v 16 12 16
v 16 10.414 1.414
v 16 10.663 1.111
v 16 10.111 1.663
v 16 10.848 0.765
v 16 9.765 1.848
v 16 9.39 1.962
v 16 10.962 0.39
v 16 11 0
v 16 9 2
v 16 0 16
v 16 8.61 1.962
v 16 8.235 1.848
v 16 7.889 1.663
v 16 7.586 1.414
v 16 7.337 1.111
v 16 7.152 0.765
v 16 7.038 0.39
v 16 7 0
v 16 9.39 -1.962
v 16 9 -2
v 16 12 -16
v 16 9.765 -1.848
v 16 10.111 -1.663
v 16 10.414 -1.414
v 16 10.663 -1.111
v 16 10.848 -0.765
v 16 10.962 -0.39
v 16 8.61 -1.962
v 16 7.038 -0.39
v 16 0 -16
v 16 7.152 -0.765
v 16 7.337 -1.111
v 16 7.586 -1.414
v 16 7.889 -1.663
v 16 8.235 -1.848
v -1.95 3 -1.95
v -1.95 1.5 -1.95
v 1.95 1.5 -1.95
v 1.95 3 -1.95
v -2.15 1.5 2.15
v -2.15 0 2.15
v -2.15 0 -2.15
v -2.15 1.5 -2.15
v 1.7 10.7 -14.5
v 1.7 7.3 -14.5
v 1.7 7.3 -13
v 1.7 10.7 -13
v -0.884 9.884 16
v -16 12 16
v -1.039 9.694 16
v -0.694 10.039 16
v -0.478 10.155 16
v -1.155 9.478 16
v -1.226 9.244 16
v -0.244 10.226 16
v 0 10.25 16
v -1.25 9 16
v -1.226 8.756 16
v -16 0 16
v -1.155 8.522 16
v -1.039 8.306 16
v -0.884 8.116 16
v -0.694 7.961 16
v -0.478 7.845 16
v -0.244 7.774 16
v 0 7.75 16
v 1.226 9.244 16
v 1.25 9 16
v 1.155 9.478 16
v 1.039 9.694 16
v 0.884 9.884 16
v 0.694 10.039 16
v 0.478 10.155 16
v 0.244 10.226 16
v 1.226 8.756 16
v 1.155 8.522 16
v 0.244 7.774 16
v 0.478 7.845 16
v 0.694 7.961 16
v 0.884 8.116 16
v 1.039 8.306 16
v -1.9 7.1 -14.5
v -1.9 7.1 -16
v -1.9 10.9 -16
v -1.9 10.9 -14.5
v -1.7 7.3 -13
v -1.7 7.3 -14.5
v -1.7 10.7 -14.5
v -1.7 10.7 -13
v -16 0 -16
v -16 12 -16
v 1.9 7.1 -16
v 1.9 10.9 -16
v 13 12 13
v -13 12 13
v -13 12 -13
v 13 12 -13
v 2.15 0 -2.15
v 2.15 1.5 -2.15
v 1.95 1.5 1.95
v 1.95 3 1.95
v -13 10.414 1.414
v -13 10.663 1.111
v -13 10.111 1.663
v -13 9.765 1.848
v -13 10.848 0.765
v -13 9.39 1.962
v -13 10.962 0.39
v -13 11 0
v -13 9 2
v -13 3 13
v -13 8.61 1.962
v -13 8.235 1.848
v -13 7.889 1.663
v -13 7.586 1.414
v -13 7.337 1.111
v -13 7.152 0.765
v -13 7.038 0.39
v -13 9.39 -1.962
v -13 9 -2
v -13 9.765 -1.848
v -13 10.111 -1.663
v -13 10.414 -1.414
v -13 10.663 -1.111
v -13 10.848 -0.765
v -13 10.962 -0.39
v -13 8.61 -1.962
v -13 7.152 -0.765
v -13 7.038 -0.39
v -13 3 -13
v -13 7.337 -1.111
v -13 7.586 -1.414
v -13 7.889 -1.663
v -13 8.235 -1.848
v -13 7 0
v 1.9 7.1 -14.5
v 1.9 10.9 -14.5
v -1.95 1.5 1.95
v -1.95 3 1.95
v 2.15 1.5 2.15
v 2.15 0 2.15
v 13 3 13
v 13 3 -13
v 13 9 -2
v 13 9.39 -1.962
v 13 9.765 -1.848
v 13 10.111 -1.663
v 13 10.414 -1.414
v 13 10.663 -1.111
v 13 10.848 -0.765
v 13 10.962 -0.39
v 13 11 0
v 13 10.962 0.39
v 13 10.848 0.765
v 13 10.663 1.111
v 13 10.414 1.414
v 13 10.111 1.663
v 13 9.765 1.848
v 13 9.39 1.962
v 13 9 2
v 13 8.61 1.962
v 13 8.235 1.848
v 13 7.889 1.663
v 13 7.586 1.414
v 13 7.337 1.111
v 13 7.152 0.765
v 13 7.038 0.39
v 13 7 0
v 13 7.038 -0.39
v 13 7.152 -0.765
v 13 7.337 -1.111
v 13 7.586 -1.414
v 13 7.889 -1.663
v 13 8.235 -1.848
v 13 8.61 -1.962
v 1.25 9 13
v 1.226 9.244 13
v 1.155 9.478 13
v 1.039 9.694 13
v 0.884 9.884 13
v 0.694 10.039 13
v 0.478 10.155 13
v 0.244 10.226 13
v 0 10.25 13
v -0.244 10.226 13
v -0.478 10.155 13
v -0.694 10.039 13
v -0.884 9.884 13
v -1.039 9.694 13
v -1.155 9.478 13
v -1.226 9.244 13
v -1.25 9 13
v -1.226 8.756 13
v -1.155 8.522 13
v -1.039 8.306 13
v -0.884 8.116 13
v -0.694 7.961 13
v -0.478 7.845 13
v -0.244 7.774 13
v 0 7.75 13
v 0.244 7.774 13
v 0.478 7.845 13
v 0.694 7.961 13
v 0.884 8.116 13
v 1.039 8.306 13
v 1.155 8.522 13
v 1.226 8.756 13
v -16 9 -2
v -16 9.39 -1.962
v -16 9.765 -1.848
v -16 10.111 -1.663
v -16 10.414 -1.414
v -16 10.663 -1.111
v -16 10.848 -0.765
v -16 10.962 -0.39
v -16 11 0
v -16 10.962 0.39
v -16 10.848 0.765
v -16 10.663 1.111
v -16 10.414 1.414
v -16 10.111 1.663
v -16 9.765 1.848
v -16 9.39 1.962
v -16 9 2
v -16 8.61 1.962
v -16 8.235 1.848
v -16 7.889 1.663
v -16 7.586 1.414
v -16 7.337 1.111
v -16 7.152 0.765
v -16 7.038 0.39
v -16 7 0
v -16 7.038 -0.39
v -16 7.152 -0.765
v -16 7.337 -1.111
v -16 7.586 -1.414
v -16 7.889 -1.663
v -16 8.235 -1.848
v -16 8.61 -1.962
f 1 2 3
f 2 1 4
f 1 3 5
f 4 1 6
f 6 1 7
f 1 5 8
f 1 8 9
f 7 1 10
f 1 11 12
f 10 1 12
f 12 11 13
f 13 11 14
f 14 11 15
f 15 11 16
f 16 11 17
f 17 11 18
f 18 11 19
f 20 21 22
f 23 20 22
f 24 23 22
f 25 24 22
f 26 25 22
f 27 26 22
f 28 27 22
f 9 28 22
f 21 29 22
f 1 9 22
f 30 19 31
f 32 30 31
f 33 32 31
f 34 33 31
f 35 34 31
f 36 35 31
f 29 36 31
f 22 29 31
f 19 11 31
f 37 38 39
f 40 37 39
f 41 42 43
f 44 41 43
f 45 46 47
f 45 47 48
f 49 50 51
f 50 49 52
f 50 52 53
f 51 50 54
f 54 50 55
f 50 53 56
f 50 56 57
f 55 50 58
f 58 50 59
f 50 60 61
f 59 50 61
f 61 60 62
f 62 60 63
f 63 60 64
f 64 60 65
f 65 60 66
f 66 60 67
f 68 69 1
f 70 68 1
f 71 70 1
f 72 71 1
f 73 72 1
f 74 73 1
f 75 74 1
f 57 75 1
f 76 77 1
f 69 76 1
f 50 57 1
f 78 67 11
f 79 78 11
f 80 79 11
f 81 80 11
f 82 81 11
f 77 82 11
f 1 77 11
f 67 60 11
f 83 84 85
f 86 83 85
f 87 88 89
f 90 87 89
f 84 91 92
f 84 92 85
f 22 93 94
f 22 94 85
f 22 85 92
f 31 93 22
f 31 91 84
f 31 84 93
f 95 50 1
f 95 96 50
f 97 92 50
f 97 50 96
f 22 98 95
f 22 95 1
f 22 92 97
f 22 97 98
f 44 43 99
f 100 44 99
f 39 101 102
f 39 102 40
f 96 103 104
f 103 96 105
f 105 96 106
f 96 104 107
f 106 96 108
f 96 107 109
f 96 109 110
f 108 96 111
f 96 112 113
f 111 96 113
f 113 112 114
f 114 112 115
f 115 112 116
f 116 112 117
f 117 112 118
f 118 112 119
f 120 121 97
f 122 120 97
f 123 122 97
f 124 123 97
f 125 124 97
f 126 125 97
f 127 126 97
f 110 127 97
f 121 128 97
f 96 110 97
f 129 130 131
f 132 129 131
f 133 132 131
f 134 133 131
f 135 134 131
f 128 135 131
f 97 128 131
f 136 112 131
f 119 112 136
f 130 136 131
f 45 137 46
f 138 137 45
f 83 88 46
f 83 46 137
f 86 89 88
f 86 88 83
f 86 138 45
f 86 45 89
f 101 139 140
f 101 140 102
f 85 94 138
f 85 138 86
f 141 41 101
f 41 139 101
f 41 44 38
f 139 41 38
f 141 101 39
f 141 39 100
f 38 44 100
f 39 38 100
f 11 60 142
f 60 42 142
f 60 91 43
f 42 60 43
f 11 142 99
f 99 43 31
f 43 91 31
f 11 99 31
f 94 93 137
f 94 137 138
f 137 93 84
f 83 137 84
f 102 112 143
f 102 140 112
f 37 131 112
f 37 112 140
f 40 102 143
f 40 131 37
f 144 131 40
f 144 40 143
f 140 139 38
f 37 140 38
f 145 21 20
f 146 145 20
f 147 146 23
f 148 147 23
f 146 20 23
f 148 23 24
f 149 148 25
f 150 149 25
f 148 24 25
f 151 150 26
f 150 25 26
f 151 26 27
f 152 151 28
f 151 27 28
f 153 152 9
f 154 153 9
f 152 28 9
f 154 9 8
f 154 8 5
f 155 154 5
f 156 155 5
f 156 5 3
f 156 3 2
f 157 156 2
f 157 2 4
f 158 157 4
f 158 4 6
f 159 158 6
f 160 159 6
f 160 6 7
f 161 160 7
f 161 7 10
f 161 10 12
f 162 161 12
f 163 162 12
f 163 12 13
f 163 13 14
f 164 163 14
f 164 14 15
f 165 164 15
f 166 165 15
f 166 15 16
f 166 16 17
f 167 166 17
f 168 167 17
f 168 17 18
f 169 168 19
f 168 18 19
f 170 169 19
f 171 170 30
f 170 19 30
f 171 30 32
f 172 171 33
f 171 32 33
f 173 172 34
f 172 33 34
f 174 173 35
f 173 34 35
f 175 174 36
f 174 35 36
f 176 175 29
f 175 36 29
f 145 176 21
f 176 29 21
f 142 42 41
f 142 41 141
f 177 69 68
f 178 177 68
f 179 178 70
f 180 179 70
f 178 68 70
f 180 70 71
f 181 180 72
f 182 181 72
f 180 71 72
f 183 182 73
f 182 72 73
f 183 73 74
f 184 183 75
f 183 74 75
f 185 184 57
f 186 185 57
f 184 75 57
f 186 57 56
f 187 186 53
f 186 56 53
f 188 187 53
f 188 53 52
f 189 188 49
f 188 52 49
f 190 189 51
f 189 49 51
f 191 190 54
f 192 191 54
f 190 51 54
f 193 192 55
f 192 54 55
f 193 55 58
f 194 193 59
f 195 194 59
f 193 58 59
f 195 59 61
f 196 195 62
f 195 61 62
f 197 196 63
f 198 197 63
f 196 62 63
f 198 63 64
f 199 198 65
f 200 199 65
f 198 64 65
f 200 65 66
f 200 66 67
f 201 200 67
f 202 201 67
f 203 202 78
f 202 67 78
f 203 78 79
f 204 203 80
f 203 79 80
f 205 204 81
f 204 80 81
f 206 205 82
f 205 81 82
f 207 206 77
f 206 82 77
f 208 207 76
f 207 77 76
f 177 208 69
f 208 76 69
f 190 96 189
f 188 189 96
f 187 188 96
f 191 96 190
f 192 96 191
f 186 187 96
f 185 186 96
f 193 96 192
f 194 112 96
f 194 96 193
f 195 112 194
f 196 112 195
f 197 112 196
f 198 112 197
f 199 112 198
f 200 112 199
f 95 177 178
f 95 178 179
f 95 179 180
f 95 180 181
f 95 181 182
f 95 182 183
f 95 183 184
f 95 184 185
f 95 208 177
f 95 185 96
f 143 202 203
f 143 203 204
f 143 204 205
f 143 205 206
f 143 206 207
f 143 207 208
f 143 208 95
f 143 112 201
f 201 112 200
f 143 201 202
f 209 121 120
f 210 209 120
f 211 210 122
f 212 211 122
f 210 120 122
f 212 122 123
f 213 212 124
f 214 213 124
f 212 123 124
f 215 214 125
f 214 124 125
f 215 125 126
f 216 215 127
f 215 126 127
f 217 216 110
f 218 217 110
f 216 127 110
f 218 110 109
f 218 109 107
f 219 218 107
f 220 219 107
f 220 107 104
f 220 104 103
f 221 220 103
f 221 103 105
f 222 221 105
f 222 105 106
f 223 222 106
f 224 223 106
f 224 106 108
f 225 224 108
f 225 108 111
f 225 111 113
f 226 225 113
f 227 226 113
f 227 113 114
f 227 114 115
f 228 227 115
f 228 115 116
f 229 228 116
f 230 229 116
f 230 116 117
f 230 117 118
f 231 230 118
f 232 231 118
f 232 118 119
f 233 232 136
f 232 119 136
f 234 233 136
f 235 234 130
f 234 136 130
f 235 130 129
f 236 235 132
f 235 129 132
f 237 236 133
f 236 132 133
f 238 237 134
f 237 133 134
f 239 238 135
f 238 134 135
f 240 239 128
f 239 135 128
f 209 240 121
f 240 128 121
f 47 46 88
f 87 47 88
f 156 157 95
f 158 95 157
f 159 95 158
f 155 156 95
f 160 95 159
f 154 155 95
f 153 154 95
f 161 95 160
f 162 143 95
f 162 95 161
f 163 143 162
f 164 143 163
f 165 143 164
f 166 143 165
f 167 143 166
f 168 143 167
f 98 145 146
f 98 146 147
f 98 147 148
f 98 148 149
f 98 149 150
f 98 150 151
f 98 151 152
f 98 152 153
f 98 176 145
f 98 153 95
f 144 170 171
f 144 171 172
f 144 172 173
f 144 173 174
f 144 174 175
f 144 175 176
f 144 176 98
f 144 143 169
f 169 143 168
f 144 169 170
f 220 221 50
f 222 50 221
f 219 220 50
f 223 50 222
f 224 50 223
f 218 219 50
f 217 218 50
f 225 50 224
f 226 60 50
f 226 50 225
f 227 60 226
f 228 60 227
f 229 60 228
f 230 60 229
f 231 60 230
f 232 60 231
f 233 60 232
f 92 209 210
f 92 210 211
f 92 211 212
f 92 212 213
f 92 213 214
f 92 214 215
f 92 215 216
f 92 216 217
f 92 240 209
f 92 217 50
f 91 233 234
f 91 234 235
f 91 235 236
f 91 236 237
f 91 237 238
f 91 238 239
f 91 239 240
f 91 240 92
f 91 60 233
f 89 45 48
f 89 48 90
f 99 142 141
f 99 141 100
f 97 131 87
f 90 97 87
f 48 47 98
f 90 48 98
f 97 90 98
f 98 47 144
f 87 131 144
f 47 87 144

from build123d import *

# Parameters (mm, degrees)
SKETCH12_W          = 26
SKETCH12_H          = 26
BOSS_EXTRUDE7_DEPTH = 3
SKETCH12_6_W        = 32
SKETCH12_6_H        = 32
SKETCH12_6_W_2      = 26
SKETCH12_6_H_2      = 26
BOSS_EXTRUDE8_DEPTH = 12
SKETCH12_7_W        = 3.9
SKETCH12_7_H        = 3.9
CUT_EXTRUDE34_DEPTH = 3
SKETCH12_8_W        = 4.3
SKETCH12_8_H        = 4.3
CUT_EXTRUDE36_DEPTH = 1.5
SKETCH23_R          = 2
CUT_EXTRUDE47_DEPTH = 32
SKETCH24_W          = 3.4
SKETCH24_H          = 3.4
CUT_EXTRUDE48_DEPTH = 3
SKETCH24_3_W        = 3.8
SKETCH24_3_H        = 3.8
CUT_EXTRUDE49_DEPTH = 1.5
SKETCH25_R          = 1.25
CUT_EXTRUDE50_DEPTH = 3


with BuildPart() as part:
    # Sketch12 → Boss-Extrude7 (new body)
    with BuildSketch(Plane(origin=(0, 0, 0), x_dir=(1, 0, 0), z_dir=(0, 1, 0))):
        Rectangle(SKETCH12_W, SKETCH12_H)
    extrude(amount=BOSS_EXTRUDE7_DEPTH)

    # Sketch12<6> → Boss-Extrude8 (add)
    with BuildSketch(Plane(origin=(0, 0, 0), x_dir=(1, 0, 0), z_dir=(0, 1, 0))):
        Rectangle(SKETCH12_6_W, SKETCH12_6_H)
        Rectangle(SKETCH12_6_W_2, SKETCH12_6_H_2, mode=Mode.SUBTRACT)
    extrude(amount=BOSS_EXTRUDE8_DEPTH)

    # Sketch12<7> → Cut-Extrude34 (cut)
    with BuildSketch(Plane(origin=(0, 0, 0), x_dir=(1, 0, 0), z_dir=(0, 1, 0))):
        Rectangle(SKETCH12_7_W, SKETCH12_7_H)
    extrude(amount=CUT_EXTRUDE34_DEPTH, mode=Mode.SUBTRACT)

    # Sketch12<8> → Cut-Extrude36 (cut)
    with BuildSketch(Plane(origin=(0, 0, 0), x_dir=(1, 0, 0), z_dir=(0, 1, 0))):
        Rectangle(SKETCH12_8_W, SKETCH12_8_H)
    extrude(amount=CUT_EXTRUDE36_DEPTH, mode=Mode.SUBTRACT)

    # Sketch23 → Cut-Extrude47 (cut)
    with BuildSketch(Plane(origin=(16, 0, 0), x_dir=(0, 0, -1), z_dir=(1, 0, 0))):
        with Locations((0, 9)):
            Circle(SKETCH23_R)
    extrude(amount=-CUT_EXTRUDE47_DEPTH, mode=Mode.SUBTRACT)

    # Sketch24 → Cut-Extrude48 (cut)
    with BuildSketch(Plane(origin=(0, 0, -16), x_dir=(-1, 0, 0), z_dir=(0, 0, -1))):
        with Locations((0, 9)):
            Rectangle(SKETCH24_W, SKETCH24_H)
    extrude(amount=-CUT_EXTRUDE48_DEPTH, mode=Mode.SUBTRACT)

    # Sketch24<3> → Cut-Extrude49 (cut)
    with BuildSketch(Plane(origin=(0, 0, -16), x_dir=(-1, 0, 0), z_dir=(0, 0, -1))):
        with Locations((0, 9)):
            Rectangle(SKETCH24_3_W, SKETCH24_3_H)
    extrude(amount=-CUT_EXTRUDE49_DEPTH, mode=Mode.SUBTRACT)

    # Sketch25 → Cut-Extrude50 (cut)
    with BuildSketch(Plane.XY.offset(16)):
        with Locations((0, 9)):
            Circle(SKETCH25_R)
    extrude(amount=-CUT_EXTRUDE50_DEPTH, mode=Mode.SUBTRACT)


solid = part.part
